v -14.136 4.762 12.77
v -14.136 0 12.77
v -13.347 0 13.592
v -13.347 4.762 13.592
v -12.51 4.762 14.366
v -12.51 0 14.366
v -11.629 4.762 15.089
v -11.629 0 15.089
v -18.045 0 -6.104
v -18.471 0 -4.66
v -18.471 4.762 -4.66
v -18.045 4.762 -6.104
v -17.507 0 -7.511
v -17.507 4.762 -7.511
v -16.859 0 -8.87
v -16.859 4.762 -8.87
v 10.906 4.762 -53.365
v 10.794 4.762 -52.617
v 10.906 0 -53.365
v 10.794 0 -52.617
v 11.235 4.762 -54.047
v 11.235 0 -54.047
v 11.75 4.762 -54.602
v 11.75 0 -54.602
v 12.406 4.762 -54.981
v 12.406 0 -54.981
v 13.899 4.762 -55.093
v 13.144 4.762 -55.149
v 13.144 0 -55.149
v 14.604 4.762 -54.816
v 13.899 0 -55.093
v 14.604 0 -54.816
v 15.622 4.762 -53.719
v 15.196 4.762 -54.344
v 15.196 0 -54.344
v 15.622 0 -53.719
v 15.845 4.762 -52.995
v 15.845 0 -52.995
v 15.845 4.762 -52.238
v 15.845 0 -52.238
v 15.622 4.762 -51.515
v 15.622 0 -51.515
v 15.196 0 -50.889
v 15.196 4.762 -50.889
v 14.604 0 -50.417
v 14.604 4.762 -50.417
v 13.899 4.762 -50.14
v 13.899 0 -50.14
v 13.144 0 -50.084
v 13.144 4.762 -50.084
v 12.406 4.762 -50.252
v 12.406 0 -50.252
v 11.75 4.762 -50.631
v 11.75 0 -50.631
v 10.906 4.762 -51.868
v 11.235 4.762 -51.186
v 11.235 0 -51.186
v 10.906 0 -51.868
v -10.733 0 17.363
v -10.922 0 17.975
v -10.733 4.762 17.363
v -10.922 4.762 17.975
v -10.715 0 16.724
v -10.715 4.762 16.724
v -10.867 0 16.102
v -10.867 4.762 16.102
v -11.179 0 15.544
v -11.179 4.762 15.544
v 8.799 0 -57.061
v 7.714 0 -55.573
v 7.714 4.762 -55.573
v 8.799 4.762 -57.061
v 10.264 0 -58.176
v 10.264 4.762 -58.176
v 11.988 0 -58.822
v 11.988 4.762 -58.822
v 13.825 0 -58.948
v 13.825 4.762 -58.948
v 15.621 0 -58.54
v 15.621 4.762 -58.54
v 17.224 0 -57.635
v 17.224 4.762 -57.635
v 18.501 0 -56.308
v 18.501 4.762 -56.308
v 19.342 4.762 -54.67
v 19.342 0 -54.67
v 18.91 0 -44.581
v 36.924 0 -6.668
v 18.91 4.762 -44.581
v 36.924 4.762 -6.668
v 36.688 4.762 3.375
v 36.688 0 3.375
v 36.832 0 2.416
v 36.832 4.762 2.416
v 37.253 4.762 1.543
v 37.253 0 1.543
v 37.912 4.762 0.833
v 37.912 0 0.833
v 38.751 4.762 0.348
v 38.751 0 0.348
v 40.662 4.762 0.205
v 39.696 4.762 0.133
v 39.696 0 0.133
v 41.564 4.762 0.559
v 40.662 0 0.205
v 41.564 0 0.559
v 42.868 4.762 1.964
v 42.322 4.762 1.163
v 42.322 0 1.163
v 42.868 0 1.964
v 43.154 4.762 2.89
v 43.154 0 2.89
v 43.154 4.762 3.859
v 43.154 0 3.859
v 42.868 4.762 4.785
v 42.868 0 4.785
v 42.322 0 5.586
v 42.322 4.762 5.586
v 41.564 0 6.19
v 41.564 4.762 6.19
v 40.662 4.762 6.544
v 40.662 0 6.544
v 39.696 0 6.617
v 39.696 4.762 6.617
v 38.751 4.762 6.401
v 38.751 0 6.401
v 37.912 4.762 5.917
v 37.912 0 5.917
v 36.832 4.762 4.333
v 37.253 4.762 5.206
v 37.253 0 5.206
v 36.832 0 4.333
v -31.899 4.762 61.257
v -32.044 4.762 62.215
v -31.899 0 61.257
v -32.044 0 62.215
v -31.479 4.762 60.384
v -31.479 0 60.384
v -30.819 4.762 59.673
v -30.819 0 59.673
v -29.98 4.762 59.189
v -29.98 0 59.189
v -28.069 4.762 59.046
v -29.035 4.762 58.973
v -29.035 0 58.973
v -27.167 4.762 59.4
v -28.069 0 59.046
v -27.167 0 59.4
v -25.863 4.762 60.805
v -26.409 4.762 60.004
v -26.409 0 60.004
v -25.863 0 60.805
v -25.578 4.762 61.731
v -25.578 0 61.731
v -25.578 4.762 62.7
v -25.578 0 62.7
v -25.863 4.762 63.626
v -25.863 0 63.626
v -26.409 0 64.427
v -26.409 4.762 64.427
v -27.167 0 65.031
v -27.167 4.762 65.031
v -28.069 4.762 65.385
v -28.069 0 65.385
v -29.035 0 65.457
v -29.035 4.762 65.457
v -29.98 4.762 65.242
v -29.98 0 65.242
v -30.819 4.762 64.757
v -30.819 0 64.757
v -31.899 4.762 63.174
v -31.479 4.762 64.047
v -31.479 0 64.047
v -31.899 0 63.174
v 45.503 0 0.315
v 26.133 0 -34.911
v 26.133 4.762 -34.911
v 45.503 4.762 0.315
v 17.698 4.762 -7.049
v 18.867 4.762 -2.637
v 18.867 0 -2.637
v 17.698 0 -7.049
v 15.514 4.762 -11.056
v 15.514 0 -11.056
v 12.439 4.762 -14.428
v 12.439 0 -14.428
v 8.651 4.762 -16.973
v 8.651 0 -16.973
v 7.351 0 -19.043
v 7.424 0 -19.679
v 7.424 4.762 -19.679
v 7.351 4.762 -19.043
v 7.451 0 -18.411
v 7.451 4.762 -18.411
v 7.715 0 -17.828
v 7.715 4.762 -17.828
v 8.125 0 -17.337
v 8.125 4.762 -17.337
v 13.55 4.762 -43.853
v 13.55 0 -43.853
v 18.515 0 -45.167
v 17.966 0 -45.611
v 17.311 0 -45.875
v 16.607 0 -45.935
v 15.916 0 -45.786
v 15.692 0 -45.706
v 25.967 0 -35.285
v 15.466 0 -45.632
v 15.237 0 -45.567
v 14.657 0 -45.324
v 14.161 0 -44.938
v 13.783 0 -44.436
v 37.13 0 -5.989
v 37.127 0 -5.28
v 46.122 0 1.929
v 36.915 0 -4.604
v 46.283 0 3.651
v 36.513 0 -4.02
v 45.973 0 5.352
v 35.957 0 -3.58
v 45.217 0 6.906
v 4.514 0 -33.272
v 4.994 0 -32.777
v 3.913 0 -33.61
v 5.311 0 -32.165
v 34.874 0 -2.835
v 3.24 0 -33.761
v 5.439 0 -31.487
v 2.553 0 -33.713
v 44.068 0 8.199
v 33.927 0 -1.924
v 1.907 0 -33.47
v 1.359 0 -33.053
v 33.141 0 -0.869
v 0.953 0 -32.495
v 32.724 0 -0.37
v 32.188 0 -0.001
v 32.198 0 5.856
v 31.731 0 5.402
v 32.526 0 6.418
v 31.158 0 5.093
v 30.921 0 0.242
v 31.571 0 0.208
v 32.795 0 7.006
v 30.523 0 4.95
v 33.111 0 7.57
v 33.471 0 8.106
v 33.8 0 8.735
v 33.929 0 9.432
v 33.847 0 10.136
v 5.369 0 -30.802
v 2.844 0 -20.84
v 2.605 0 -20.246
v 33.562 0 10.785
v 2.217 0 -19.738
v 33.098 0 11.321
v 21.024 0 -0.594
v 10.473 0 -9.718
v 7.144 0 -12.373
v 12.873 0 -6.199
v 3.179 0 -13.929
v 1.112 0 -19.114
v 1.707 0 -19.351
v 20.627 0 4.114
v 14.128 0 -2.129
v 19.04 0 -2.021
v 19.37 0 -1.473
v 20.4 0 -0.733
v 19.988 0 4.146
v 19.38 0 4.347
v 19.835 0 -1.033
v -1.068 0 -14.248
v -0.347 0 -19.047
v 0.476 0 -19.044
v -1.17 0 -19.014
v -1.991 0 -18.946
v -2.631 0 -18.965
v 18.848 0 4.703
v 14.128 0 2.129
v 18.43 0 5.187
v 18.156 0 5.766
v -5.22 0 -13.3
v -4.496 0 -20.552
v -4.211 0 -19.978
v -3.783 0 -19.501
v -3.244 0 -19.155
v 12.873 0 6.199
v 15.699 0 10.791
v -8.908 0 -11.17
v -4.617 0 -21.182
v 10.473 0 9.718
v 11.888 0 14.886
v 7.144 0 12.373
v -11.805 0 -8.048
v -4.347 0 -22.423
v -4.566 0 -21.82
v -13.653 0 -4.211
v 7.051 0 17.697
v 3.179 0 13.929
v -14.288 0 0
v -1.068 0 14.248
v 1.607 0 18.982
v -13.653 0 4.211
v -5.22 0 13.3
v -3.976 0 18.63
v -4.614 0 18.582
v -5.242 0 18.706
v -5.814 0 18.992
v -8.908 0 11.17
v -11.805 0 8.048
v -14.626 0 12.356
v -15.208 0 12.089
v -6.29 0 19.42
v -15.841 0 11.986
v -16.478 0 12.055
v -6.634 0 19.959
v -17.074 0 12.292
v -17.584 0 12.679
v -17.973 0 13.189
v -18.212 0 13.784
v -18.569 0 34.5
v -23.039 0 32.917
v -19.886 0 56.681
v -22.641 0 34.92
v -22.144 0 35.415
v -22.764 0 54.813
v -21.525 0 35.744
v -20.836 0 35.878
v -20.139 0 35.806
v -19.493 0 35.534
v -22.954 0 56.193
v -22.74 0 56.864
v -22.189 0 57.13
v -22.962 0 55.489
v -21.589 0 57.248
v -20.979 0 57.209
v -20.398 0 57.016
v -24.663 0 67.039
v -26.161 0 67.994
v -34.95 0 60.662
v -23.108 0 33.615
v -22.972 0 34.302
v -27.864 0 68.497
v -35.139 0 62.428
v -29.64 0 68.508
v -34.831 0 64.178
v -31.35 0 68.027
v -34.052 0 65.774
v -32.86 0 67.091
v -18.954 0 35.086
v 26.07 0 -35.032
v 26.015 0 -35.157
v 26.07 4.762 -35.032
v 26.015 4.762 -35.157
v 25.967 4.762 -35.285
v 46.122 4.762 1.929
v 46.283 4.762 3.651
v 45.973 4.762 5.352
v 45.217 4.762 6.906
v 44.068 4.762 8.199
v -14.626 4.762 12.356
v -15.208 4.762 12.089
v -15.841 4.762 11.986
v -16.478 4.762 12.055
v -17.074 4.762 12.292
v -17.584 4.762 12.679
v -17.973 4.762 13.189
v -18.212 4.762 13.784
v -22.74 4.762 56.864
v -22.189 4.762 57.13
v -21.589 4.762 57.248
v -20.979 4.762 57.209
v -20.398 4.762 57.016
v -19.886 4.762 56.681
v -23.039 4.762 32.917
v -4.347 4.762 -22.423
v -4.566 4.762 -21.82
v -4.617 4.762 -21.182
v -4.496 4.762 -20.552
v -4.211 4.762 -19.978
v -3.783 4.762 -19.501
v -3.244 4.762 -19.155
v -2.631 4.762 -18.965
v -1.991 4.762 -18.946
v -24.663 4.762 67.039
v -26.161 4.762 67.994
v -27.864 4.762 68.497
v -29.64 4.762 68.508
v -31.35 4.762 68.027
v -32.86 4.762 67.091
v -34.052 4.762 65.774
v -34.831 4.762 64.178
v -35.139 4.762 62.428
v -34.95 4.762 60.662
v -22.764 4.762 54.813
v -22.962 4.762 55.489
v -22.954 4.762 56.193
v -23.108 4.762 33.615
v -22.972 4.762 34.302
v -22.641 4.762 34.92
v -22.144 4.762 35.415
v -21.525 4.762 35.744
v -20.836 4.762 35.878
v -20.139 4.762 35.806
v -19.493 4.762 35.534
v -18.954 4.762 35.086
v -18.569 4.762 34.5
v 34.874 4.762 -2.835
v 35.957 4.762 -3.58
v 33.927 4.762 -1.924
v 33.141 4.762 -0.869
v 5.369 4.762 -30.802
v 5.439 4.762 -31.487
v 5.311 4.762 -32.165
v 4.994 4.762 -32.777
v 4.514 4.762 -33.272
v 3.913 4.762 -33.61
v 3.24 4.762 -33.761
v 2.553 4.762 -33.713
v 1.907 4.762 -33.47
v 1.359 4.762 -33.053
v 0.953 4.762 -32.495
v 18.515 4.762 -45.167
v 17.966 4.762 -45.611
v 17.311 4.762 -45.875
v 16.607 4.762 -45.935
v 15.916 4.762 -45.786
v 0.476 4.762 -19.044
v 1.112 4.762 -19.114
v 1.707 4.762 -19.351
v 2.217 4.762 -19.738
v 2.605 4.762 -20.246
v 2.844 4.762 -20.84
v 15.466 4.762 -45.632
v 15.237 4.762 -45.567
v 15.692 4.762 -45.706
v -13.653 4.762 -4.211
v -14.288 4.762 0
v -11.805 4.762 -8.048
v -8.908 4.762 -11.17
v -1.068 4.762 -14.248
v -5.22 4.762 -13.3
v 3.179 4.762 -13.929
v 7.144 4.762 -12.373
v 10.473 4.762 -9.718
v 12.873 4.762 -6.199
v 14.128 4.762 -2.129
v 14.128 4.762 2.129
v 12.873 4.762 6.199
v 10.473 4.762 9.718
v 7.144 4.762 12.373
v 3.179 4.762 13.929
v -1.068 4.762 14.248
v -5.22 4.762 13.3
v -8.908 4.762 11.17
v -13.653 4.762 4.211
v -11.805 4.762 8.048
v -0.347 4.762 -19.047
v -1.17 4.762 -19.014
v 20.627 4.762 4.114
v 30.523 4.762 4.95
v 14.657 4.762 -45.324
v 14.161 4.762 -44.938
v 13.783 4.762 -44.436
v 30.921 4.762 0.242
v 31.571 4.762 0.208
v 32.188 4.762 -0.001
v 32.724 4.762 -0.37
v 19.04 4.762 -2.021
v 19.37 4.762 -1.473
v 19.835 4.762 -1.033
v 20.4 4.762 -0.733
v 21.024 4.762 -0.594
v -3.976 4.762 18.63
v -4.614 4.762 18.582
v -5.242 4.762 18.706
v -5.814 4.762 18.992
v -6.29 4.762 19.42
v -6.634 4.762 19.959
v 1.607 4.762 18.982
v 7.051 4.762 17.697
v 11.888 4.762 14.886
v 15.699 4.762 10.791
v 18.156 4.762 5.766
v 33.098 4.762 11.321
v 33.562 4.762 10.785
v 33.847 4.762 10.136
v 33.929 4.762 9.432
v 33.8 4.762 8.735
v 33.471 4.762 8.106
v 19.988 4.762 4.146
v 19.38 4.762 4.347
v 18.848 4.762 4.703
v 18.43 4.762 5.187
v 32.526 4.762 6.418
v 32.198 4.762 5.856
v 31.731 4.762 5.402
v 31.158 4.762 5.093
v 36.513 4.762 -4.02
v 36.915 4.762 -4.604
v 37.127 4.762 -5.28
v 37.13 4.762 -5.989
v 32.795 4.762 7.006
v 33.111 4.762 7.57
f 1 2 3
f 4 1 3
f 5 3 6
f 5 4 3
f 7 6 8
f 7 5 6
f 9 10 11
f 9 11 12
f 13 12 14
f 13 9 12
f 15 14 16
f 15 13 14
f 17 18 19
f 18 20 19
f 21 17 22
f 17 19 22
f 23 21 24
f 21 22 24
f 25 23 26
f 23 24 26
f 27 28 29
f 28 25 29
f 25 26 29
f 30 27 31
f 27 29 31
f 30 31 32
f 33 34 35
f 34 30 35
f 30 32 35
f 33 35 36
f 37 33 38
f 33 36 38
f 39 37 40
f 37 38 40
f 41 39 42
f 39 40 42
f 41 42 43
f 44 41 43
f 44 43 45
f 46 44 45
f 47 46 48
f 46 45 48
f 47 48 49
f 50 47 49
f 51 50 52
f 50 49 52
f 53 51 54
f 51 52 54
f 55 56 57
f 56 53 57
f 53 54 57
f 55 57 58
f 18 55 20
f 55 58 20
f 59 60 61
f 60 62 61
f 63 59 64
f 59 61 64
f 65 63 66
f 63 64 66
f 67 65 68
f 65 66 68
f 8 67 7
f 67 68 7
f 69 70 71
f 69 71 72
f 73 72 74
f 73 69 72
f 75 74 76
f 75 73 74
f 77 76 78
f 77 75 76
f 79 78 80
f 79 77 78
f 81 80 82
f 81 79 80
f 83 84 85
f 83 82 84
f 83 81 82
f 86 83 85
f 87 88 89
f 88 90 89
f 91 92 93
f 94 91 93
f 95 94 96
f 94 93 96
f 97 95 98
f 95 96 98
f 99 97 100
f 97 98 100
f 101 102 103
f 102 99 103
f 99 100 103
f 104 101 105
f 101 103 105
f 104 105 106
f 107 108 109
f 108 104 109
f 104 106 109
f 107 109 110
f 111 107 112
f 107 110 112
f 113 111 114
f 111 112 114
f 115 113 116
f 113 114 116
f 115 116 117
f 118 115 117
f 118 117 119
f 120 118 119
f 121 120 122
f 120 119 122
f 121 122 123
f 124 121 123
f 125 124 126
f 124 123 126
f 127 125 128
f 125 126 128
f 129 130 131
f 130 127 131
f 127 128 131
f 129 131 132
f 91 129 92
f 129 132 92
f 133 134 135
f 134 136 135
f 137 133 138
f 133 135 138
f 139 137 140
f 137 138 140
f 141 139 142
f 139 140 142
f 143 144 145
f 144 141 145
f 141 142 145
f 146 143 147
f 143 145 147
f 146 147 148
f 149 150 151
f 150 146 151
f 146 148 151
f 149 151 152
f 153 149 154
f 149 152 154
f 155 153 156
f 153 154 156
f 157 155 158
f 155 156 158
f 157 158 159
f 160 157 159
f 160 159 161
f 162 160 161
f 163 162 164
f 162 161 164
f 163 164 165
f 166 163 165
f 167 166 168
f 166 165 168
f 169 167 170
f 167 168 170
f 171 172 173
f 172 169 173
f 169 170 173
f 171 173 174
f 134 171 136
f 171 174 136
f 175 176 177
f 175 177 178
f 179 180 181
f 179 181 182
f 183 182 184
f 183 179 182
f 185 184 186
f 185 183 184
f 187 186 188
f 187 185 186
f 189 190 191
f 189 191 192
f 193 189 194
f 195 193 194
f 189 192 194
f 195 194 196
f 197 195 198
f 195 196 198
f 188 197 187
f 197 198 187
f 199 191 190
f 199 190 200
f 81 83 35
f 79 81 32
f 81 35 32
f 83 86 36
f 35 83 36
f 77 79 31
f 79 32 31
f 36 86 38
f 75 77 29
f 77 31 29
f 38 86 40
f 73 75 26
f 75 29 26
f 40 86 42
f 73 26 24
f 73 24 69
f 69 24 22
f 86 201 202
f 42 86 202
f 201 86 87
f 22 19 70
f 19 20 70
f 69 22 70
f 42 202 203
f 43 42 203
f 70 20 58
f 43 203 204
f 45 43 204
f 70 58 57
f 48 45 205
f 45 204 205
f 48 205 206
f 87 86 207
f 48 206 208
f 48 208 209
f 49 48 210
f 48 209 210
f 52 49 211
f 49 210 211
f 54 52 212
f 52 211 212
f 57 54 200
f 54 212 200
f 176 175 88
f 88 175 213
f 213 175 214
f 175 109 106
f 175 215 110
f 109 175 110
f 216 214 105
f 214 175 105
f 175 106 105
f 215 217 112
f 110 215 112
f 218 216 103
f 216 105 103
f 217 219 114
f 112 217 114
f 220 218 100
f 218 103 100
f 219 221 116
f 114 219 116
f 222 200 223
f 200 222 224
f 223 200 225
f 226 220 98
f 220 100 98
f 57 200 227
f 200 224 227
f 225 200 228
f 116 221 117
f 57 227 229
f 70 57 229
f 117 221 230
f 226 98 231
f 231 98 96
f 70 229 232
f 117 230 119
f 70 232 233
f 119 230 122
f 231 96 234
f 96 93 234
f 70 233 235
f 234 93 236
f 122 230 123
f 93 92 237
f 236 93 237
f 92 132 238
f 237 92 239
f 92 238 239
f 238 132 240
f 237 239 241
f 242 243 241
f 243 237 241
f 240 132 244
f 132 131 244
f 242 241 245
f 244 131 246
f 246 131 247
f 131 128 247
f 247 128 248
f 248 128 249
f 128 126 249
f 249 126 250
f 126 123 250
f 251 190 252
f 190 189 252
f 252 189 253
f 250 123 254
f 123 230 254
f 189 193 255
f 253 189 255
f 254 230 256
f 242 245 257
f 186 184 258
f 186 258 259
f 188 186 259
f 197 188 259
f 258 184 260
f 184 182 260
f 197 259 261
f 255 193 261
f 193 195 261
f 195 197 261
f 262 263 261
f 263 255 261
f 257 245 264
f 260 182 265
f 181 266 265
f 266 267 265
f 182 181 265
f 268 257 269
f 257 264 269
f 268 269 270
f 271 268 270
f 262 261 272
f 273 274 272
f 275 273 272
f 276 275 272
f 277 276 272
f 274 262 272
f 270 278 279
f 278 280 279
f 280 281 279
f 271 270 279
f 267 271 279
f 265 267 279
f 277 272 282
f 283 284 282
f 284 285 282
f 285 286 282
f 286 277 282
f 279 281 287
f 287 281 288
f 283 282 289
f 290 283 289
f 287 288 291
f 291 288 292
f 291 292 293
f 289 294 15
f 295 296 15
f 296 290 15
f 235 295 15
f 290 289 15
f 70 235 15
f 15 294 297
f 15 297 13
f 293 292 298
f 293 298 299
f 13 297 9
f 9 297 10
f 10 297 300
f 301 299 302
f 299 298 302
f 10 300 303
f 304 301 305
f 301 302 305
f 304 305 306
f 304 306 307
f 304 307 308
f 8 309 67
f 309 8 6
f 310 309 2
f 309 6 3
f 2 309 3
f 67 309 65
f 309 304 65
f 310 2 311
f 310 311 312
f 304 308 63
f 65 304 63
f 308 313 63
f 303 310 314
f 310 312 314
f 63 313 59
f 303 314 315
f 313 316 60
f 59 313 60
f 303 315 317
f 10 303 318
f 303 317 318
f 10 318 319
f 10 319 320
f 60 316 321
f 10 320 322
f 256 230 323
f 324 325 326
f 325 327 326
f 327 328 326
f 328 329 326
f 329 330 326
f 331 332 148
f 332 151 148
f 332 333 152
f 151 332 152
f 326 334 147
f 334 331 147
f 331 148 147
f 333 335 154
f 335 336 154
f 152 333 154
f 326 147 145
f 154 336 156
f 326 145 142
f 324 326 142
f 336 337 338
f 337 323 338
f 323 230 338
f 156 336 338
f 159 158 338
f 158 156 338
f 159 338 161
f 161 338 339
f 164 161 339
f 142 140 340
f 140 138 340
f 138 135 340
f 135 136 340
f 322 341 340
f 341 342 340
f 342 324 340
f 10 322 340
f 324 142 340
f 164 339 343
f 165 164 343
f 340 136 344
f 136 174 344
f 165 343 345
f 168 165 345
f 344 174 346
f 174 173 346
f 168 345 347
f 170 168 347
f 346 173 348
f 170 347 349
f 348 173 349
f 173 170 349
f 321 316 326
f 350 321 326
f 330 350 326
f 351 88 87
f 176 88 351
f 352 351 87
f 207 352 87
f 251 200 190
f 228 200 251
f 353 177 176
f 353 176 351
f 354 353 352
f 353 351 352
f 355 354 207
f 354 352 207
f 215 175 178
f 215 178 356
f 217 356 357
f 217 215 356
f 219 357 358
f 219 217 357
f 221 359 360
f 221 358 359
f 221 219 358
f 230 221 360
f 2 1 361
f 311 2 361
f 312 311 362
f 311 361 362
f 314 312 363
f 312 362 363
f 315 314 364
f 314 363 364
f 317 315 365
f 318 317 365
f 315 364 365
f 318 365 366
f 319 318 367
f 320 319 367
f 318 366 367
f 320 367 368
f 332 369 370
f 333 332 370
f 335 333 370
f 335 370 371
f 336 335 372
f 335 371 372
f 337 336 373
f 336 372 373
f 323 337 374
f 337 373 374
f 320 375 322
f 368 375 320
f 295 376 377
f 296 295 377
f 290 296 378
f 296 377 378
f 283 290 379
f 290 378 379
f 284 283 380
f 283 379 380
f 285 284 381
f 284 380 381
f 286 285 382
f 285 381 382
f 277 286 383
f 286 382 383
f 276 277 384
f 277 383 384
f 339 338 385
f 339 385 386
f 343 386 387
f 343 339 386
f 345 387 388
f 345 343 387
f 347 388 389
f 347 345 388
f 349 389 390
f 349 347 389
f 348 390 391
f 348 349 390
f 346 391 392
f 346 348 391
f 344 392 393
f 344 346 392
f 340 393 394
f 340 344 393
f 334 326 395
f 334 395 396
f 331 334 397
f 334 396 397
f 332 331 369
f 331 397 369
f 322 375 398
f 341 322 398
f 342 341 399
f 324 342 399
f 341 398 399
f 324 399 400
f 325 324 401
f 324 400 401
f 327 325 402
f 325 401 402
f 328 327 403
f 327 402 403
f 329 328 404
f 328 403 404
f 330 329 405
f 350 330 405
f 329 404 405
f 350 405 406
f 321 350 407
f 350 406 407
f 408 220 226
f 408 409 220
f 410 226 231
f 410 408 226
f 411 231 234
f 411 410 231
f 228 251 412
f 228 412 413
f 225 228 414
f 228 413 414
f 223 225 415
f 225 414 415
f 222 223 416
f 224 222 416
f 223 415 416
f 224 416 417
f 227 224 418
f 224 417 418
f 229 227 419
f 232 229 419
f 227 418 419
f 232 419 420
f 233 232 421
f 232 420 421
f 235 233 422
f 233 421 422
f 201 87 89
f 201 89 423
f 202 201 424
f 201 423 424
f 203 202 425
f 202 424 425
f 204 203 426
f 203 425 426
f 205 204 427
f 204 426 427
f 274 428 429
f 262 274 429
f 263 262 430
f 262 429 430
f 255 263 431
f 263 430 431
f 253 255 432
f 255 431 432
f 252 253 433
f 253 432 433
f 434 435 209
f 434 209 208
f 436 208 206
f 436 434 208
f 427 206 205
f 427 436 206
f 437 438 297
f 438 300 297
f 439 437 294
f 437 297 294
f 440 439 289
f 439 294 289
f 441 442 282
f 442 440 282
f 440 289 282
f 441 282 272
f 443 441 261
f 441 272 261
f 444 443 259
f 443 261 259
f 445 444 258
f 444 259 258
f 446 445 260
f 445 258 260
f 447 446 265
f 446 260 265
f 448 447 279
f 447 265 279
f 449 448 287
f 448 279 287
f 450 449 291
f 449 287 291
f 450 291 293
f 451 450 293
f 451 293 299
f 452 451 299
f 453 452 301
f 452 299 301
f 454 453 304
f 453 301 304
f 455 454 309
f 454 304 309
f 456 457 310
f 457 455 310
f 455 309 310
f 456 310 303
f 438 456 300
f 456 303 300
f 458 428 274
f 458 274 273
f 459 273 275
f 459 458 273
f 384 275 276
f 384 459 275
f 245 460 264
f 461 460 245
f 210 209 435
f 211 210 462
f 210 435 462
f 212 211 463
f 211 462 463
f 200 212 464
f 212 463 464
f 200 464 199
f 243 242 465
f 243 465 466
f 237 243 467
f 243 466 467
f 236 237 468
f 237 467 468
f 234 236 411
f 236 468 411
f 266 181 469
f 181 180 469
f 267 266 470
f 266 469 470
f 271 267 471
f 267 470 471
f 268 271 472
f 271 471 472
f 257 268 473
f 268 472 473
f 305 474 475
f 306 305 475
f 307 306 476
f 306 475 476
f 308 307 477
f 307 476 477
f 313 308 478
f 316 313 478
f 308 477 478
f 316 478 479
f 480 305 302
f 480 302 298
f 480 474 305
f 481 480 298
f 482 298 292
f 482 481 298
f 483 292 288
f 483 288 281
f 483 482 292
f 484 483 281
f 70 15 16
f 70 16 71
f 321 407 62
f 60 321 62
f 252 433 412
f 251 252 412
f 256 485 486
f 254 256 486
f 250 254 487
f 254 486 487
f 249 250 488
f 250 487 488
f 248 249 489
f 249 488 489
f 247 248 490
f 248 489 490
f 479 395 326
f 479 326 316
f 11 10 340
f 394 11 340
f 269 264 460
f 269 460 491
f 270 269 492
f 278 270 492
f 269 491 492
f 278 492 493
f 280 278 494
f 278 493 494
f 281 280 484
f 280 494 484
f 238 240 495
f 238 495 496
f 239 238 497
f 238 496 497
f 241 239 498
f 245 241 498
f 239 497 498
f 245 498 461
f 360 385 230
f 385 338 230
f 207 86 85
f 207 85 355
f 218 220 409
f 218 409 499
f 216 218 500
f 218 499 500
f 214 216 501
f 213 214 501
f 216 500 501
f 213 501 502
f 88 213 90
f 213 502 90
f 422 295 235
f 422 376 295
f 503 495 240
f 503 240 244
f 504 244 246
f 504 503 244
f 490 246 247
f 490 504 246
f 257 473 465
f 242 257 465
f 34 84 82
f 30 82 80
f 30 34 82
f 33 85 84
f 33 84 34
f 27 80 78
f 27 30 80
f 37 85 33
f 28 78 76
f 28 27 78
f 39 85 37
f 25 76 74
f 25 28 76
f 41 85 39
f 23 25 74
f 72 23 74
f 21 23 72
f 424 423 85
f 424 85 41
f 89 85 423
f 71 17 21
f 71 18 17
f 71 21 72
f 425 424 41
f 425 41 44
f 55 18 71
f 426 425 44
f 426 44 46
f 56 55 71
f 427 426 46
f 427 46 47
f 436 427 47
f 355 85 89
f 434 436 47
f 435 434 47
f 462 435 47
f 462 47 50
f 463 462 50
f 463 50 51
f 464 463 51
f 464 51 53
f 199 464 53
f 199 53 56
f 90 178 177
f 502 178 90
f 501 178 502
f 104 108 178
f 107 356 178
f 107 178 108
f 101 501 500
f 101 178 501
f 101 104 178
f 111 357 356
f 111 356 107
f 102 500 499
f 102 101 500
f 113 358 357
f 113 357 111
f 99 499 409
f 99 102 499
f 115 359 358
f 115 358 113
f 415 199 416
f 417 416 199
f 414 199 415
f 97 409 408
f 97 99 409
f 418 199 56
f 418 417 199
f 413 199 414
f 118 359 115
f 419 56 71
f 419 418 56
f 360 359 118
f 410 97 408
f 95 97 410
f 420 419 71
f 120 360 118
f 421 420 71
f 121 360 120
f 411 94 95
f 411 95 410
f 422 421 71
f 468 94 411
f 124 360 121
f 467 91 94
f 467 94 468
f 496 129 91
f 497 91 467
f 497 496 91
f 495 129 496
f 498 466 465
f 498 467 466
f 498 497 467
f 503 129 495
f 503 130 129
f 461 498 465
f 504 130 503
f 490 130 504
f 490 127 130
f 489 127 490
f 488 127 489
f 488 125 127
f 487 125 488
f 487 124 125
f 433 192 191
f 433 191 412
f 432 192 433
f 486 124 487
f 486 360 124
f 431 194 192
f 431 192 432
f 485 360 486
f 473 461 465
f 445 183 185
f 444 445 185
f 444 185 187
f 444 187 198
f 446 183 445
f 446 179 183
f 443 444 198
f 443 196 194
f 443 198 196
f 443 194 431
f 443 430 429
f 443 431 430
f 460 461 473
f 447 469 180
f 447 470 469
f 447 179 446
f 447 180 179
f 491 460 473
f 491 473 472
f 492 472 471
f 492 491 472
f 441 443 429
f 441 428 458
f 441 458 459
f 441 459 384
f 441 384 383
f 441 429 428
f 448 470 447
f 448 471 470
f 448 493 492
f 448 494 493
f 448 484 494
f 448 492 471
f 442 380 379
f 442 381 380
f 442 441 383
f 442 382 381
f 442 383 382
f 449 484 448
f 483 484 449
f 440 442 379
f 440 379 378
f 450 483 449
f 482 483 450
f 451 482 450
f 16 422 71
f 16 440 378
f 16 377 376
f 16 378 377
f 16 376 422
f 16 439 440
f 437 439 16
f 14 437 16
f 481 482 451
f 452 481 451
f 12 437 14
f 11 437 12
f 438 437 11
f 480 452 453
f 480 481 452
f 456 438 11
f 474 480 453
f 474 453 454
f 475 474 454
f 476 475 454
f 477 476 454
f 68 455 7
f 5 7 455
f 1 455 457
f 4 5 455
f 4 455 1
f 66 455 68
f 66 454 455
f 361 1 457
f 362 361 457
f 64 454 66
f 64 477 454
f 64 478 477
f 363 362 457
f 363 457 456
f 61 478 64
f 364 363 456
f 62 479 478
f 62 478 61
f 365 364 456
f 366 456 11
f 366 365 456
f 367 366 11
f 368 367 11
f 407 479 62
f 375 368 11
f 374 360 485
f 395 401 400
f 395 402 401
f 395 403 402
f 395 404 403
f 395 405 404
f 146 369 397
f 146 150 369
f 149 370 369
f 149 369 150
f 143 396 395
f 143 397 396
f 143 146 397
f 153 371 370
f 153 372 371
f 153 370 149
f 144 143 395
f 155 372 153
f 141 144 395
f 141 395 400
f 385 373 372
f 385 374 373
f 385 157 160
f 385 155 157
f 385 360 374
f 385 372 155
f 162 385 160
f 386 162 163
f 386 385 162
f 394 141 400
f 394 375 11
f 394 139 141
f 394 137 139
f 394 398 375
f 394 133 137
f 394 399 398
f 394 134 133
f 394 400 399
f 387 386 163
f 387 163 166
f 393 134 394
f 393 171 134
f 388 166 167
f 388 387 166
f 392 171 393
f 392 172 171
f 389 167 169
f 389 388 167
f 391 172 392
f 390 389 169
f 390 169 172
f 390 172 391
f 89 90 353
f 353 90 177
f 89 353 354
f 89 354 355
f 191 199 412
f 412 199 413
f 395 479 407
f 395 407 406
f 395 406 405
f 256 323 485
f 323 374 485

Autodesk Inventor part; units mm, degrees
ref_plane "YZ Plane" through (0, 0, 0) normal (1, 0, 0) x (0, 1, 0)
ref_plane "XZ Plane" through (0, 0, 0) normal (0, 1, 0) x (-1, 0, 0)
ref_plane "XY Plane" through (0, 0, 0) normal (0, 0, 1) x (1, 0, 0)
sketch "Sketch1" plane through (0, 0, 0) normal (0, 1, 0) x (-1, 0, 0)
  circle A0 centre (0, 0) radius 14.2875
  line L0 (0, 0) -> (28.7924, 62.2152) construction
  line L1 (0, 0) -> (-39.9389, 3.3748) construction
  line L2 (0, 0) -> (-13.3336, -52.6166) construction
  circle A1 centre (28.7924, 62.2152) radius 3.2512
  circle A2 centre (-39.9389, 3.3748) radius 3.2512
  circle A3 centre (-13.3336, -52.6166) radius 2.54
  line L3 (0, 0) -> (0, 14.2875) construction
  circle A4 centre (28.7924, 62.2152) radius 6.35 construction
  circle A5 centre (-13.3336, -52.6166) radius 6.35 construction
  circle A6 centre (-39.9389, 3.3748) radius 6.35 construction
  circle A7 centre (0, 0) radius 19.05 construction
  line L4 (24.6628, 67.039) -> (-44.0685, 8.1986)
  line L5 (16.8588, -8.8703) -> (-7.714, -55.5734)
  line L6 (18.4713, -4.6596) -> (34.9495, 60.662)
  arc A8 (34.9495, 60.662) -> (24.6628, 67.039) centre (28.7924, 62.2152) ccw
  arc A9 (-44.0685, 8.1986) -> (-45.5031, 0.3151) centre (-39.9389, 3.3748) ccw
  arc A10 (-19.3424, -54.6701) -> (-7.714, -55.5734) centre (-13.3336, -52.6166) ccw
  arc A11 (16.8588, -8.8703) -> (18.4713, -4.6596) centre (0, 0) ccw
  line L7 (-13.3336, -52.6166) -> (-26.0336, -52.6166) construction
  line L8 (-26.0336, -52.6166) -> (-26.0336, -35.0906) construction
  line L9 (-26.0336, -35.0906) -> (-38.7336, -35.0906) construction
  line L10 (-19.3424, -54.6701) -> (-25.9672, -35.285)
  line L11 (-26.1326, -34.9107) -> (-45.5031, 0.3151)
  arc A12 (-25.9672, -35.285) -> (-26.1326, -34.9107) centre (-28.2025, -36.0489) ccw
  dimension "d0" = 28.575
  dimension "d1" = 6.5024
  dimension "d2" = 68.5546
  dimension "d3" = 40.0812
  dimension "d4" = 54.2798
  dimension "d5" = 24.834
  dimension "d8" = 85.17
  dimension "d9" = 12.7
  dimension "d10" = 4.7625
  dimension "d32" = 80.61
  dimension "d33" = 5.08
  dimension "d34" = 12.7
  dimension "d35" = 17.526
  dimension "d36" = 12.7
  dimension "d37" = 2.3622
extrude "Extrusion1" add sketch "Sketch1" along normal blind 4.7625
sketch "Sketch2" plane through (0, 4.7625, 0) normal (0, 1, 0) x (1, 0, 0)
  line L0 (-18.4713, 4.6596) -> (-34.9495, -60.662) construction
  arc A0 (-34.9495, -60.662) -> (-24.6628, -67.039) centre (-28.7924, -62.2152) ccw construction
  line L1 (-24.6628, -67.039) -> (44.0685, -8.1986) construction
  arc A1 (44.0685, -8.1986) -> (45.5031, -0.3151) centre (39.9389, -3.3748) ccw construction
  arc A2 (19.3424, 54.6701) -> (7.714, 55.5734) centre (13.3336, 52.6166) ccw construction
  line L2 (7.714, 55.5734) -> (-16.8588, 8.8703) construction
  arc A3 (-16.8588, 8.8703) -> (-18.4713, 4.6596) centre (0, 0) ccw construction
  circle A4 centre (13.3336, 52.6166) radius 2.54 construction
  circle A5 centre (39.9389, -3.3748) radius 3.2512 construction
  circle A6 centre (-28.7924, -62.2152) radius 3.2512 construction
  circle A7 centre (0, 0) radius 14.2875 construction
  line L3 (-30.3316, -61.8269) -> (-13.8535, 3.4947) construction
  arc A8 (-12.6441, 6.6527) -> (-13.8535, 3.4947) centre (0, 0) ccw construction
  line L4 (-12.6441, 6.6527) -> (11.9287, 53.3558) construction
  arc A9 (14.7675, 53.298) -> (11.9287, 53.3558) centre (13.3336, 52.6166) ccw construction
  line L5 (14.7675, 53.298) -> (41.3727, -2.6935) construction
  arc A10 (40.9713, -4.5808) -> (41.3727, -2.6935) centre (39.9389, -3.3748) ccw construction
  line L6 (40.9713, -4.5808) -> (-27.76, -63.4212) construction
  arc A11 (-30.3316, -61.8269) -> (-27.76, -63.4212) centre (-28.7924, -62.2152) ccw construction
  circle A12 centre (-28.7924, -62.2152) radius 8.0137 construction
  circle A13 centre (0, 0) radius 19.05 construction
  circle A14 centre (39.9389, -3.3748) radius 8.0137 construction
  circle A15 centre (13.3336, 52.6166) radius 7.3025 construction
  line L7 (-25.4267, -54.9426) -> (-8.0008, -17.2884) construction
  line L8 (18.9824, -1.604) -> (31.9536, -2.7001) construction
  line L9 (4.6796, 18.4663) -> (11.5398, 45.5379) construction
  line L10 (-18.5688, -34.4995) -> (-10.9215, -17.975)
  line L11 (-22.7639, -54.8131) -> (-6.6339, -19.9592)
  line L12 (7.4237, 19.6791) -> (13.5496, 43.8526)
  line L13 (2.8441, 20.8396) -> (5.3686, 30.8015)
  line L14 (20.6266, -4.1136) -> (30.5232, -4.9498)
  line L15 (21.0244, 0.5941) -> (30.921, -0.2422)
  arc A16 (-3.9759, -18.6305) -> (18.1565, -5.7656) centre (0, 0) ccw
  arc A17 (-23.1205, -56.554) -> (-22.4788, -57.2797) centre (-28.7924, -62.2152) ccw
  arc A18 (32.5256, -6.4183) -> (33.4711, -8.1063) centre (39.9389, -3.3748) ccw
  line L16 (-19.8865, -56.6807) -> (33.0978, -11.3212)
  arc A19 (-22.7639, -54.8131) -> (-22.4788, -57.2797) centre (-20.6028, -55.8132) ccw
  arc A20 (-23.1205, -56.554) -> (-19.8865, -56.6807) centre (-21.4351, -54.8718) ccw
  arc A21 (-3.9759, -18.6305) -> (-6.6339, -19.9592) centre (-4.4729, -20.9593) ccw
  arc A22 (20.6266, -4.1136) -> (18.1565, -5.7656) centre (20.4261, -6.4864) ccw
  arc A23 (32.5256, -6.4183) -> (30.5232, -4.9498) centre (30.3227, -7.3226) ccw
  arc A24 (33.0978, -11.3212) -> (33.4711, -8.1063) centre (31.5492, -9.5123) ccw
  line L17 (36.9245, 6.668) -> (18.9095, 44.5809)
  arc A25 (18.8666, 2.6372) -> (8.6507, 16.9726) centre (0, 0) ccw
  arc A26 (15.2371, 45.5666) -> (15.9165, 45.7862) centre (13.3336, 52.6166) ccw
  arc A27 (35.9569, 3.5796) -> (33.1414, 0.8694) centre (39.9389, -3.3748) ccw
  arc A28 (7.4237, 19.6791) -> (8.6507, 16.9726) centre (9.732, 19.0941) ccw
  arc A29 (18.8666, 2.6372) -> (21.0244, 0.5941) centre (21.2249, 2.9669) ccw
  arc A30 (30.921, -0.2422) -> (33.1414, 0.8694) centre (31.1215, 2.1306) ccw
  arc A31 (35.9569, 3.5796) -> (36.9245, 6.668) centre (34.7737, 5.646) ccw
  arc A32 (15.2371, 45.5666) -> (13.5496, 43.8526) centre (15.8579, 43.2677) ccw
  arc A33 (18.9095, 44.5809) -> (15.9165, 45.7862) centre (16.7588, 43.5589) ccw
  line L18 (-4.3468, 22.4227) -> (0.9529, 32.4953)
  arc A34 (0.4763, 19.044) -> (-1.9906, 18.9457) centre (0, 0) ccw
  arc A35 (5.3686, 30.8015) -> (0.9529, 32.4953) centre (3.0603, 31.3865) ccw
  arc A36 (-4.3468, 22.4227) -> (-1.9906, 18.9457) centre (-2.2394, 21.3139) ccw
  arc A37 (0.4763, 19.044) -> (2.8441, 20.8396) centre (0.5358, 21.4246) ccw
  line L19 (-23.0388, -32.9169) -> (-18.2122, -13.7837)
  arc A38 (-14.1362, -12.7699) -> (-11.6289, -15.0888) centre (0, 0) ccw
  arc A39 (-23.0388, -32.9169) -> (-18.5688, -34.4995) centre (-20.7298, -33.4994) ccw
  arc A40 (-14.1362, -12.7699) -> (-18.2122, -13.7837) centre (-15.9033, -14.3661) ccw
  arc A41 (-10.9215, -17.975) -> (-11.6289, -15.0888) centre (-13.0825, -16.9749) ccw
  line L20 (45.5031, -0.3151) -> (26.1326, 34.9107) projected
  arc A42 (25.9672, 35.285) -> (26.1326, 34.9107) centre (28.2025, 36.0489) ccw projected
  line L21 (25.9672, 35.285) -> (19.3424, 54.6701) projected
  point P0 (-27.72, -54.2736)
  point P1 (-10.0829, -16.1629)
  point P2 (-23.4325, -56.2578)
  point P3 (-5.7953, -18.1471)
  point P4 (6.9333, 17.7435)
  point P5 (13.926, 45.3382)
  point P6 (2.3536, 18.904)
  point P7 (9.3464, 46.4987)
  point P8 (18.637, -3.9454)
  point P9 (32.1095, -5.0839)
  point P10 (19.0347, 0.7622)
  point P11 (32.5073, -0.3762)
  point P12 (-21.793, -58.3129)
  point P13 (35.0043, -9.689)
  point P14 (38.0016, 4.4012)
  point P15 (17.8266, 46.86)
  point P16 (-6.777, 17.8038)
  point P17 (8.6097, 47.0478)
  point P18 (-28.4103, -54.2106)
  point P19 (-16.9355, -8.7229)
  point P20 (-22.7397, -56.8639)
  dimension "d13" = 4.7625
  dimension "d14" = 4.7625
  dimension "d15" = 4.7625
  dimension "d16" = 4.7625
  dimension "d17" = 4.7625
  dimension "d18" = 2.3622
  dimension "d19" = 2.3622
  dimension "d20" = 2.3622
  dimension "d21" = 2.3622
  dimension "d22" = 2.3622
  dimension "d23" = 2.3622
  dimension "d24" = 2.3813
  dimension "d25" = 2.3813
  dimension "d26" = 2.3813
  dimension "d27" = 2.3813
  dimension "d28" = 2.3813
  dimension "d29" = 2.3813
extrude "Extrusion2" cut sketch "Sketch2" against normal blind 4.7625 contours A39 L19 A40 A38 A41 L10 | L11 A21 A16 A22 L14 A23 A18 A24 L16 A20 A19 | L12 A32 A26 A33 L17 A31 A27 A30 L15 A29 A25 A28 | A37 A34 A36 L18 A35 L13
properties part number "ELEV_036_SPRKTBRKT1" material "Aluminum 6061"
